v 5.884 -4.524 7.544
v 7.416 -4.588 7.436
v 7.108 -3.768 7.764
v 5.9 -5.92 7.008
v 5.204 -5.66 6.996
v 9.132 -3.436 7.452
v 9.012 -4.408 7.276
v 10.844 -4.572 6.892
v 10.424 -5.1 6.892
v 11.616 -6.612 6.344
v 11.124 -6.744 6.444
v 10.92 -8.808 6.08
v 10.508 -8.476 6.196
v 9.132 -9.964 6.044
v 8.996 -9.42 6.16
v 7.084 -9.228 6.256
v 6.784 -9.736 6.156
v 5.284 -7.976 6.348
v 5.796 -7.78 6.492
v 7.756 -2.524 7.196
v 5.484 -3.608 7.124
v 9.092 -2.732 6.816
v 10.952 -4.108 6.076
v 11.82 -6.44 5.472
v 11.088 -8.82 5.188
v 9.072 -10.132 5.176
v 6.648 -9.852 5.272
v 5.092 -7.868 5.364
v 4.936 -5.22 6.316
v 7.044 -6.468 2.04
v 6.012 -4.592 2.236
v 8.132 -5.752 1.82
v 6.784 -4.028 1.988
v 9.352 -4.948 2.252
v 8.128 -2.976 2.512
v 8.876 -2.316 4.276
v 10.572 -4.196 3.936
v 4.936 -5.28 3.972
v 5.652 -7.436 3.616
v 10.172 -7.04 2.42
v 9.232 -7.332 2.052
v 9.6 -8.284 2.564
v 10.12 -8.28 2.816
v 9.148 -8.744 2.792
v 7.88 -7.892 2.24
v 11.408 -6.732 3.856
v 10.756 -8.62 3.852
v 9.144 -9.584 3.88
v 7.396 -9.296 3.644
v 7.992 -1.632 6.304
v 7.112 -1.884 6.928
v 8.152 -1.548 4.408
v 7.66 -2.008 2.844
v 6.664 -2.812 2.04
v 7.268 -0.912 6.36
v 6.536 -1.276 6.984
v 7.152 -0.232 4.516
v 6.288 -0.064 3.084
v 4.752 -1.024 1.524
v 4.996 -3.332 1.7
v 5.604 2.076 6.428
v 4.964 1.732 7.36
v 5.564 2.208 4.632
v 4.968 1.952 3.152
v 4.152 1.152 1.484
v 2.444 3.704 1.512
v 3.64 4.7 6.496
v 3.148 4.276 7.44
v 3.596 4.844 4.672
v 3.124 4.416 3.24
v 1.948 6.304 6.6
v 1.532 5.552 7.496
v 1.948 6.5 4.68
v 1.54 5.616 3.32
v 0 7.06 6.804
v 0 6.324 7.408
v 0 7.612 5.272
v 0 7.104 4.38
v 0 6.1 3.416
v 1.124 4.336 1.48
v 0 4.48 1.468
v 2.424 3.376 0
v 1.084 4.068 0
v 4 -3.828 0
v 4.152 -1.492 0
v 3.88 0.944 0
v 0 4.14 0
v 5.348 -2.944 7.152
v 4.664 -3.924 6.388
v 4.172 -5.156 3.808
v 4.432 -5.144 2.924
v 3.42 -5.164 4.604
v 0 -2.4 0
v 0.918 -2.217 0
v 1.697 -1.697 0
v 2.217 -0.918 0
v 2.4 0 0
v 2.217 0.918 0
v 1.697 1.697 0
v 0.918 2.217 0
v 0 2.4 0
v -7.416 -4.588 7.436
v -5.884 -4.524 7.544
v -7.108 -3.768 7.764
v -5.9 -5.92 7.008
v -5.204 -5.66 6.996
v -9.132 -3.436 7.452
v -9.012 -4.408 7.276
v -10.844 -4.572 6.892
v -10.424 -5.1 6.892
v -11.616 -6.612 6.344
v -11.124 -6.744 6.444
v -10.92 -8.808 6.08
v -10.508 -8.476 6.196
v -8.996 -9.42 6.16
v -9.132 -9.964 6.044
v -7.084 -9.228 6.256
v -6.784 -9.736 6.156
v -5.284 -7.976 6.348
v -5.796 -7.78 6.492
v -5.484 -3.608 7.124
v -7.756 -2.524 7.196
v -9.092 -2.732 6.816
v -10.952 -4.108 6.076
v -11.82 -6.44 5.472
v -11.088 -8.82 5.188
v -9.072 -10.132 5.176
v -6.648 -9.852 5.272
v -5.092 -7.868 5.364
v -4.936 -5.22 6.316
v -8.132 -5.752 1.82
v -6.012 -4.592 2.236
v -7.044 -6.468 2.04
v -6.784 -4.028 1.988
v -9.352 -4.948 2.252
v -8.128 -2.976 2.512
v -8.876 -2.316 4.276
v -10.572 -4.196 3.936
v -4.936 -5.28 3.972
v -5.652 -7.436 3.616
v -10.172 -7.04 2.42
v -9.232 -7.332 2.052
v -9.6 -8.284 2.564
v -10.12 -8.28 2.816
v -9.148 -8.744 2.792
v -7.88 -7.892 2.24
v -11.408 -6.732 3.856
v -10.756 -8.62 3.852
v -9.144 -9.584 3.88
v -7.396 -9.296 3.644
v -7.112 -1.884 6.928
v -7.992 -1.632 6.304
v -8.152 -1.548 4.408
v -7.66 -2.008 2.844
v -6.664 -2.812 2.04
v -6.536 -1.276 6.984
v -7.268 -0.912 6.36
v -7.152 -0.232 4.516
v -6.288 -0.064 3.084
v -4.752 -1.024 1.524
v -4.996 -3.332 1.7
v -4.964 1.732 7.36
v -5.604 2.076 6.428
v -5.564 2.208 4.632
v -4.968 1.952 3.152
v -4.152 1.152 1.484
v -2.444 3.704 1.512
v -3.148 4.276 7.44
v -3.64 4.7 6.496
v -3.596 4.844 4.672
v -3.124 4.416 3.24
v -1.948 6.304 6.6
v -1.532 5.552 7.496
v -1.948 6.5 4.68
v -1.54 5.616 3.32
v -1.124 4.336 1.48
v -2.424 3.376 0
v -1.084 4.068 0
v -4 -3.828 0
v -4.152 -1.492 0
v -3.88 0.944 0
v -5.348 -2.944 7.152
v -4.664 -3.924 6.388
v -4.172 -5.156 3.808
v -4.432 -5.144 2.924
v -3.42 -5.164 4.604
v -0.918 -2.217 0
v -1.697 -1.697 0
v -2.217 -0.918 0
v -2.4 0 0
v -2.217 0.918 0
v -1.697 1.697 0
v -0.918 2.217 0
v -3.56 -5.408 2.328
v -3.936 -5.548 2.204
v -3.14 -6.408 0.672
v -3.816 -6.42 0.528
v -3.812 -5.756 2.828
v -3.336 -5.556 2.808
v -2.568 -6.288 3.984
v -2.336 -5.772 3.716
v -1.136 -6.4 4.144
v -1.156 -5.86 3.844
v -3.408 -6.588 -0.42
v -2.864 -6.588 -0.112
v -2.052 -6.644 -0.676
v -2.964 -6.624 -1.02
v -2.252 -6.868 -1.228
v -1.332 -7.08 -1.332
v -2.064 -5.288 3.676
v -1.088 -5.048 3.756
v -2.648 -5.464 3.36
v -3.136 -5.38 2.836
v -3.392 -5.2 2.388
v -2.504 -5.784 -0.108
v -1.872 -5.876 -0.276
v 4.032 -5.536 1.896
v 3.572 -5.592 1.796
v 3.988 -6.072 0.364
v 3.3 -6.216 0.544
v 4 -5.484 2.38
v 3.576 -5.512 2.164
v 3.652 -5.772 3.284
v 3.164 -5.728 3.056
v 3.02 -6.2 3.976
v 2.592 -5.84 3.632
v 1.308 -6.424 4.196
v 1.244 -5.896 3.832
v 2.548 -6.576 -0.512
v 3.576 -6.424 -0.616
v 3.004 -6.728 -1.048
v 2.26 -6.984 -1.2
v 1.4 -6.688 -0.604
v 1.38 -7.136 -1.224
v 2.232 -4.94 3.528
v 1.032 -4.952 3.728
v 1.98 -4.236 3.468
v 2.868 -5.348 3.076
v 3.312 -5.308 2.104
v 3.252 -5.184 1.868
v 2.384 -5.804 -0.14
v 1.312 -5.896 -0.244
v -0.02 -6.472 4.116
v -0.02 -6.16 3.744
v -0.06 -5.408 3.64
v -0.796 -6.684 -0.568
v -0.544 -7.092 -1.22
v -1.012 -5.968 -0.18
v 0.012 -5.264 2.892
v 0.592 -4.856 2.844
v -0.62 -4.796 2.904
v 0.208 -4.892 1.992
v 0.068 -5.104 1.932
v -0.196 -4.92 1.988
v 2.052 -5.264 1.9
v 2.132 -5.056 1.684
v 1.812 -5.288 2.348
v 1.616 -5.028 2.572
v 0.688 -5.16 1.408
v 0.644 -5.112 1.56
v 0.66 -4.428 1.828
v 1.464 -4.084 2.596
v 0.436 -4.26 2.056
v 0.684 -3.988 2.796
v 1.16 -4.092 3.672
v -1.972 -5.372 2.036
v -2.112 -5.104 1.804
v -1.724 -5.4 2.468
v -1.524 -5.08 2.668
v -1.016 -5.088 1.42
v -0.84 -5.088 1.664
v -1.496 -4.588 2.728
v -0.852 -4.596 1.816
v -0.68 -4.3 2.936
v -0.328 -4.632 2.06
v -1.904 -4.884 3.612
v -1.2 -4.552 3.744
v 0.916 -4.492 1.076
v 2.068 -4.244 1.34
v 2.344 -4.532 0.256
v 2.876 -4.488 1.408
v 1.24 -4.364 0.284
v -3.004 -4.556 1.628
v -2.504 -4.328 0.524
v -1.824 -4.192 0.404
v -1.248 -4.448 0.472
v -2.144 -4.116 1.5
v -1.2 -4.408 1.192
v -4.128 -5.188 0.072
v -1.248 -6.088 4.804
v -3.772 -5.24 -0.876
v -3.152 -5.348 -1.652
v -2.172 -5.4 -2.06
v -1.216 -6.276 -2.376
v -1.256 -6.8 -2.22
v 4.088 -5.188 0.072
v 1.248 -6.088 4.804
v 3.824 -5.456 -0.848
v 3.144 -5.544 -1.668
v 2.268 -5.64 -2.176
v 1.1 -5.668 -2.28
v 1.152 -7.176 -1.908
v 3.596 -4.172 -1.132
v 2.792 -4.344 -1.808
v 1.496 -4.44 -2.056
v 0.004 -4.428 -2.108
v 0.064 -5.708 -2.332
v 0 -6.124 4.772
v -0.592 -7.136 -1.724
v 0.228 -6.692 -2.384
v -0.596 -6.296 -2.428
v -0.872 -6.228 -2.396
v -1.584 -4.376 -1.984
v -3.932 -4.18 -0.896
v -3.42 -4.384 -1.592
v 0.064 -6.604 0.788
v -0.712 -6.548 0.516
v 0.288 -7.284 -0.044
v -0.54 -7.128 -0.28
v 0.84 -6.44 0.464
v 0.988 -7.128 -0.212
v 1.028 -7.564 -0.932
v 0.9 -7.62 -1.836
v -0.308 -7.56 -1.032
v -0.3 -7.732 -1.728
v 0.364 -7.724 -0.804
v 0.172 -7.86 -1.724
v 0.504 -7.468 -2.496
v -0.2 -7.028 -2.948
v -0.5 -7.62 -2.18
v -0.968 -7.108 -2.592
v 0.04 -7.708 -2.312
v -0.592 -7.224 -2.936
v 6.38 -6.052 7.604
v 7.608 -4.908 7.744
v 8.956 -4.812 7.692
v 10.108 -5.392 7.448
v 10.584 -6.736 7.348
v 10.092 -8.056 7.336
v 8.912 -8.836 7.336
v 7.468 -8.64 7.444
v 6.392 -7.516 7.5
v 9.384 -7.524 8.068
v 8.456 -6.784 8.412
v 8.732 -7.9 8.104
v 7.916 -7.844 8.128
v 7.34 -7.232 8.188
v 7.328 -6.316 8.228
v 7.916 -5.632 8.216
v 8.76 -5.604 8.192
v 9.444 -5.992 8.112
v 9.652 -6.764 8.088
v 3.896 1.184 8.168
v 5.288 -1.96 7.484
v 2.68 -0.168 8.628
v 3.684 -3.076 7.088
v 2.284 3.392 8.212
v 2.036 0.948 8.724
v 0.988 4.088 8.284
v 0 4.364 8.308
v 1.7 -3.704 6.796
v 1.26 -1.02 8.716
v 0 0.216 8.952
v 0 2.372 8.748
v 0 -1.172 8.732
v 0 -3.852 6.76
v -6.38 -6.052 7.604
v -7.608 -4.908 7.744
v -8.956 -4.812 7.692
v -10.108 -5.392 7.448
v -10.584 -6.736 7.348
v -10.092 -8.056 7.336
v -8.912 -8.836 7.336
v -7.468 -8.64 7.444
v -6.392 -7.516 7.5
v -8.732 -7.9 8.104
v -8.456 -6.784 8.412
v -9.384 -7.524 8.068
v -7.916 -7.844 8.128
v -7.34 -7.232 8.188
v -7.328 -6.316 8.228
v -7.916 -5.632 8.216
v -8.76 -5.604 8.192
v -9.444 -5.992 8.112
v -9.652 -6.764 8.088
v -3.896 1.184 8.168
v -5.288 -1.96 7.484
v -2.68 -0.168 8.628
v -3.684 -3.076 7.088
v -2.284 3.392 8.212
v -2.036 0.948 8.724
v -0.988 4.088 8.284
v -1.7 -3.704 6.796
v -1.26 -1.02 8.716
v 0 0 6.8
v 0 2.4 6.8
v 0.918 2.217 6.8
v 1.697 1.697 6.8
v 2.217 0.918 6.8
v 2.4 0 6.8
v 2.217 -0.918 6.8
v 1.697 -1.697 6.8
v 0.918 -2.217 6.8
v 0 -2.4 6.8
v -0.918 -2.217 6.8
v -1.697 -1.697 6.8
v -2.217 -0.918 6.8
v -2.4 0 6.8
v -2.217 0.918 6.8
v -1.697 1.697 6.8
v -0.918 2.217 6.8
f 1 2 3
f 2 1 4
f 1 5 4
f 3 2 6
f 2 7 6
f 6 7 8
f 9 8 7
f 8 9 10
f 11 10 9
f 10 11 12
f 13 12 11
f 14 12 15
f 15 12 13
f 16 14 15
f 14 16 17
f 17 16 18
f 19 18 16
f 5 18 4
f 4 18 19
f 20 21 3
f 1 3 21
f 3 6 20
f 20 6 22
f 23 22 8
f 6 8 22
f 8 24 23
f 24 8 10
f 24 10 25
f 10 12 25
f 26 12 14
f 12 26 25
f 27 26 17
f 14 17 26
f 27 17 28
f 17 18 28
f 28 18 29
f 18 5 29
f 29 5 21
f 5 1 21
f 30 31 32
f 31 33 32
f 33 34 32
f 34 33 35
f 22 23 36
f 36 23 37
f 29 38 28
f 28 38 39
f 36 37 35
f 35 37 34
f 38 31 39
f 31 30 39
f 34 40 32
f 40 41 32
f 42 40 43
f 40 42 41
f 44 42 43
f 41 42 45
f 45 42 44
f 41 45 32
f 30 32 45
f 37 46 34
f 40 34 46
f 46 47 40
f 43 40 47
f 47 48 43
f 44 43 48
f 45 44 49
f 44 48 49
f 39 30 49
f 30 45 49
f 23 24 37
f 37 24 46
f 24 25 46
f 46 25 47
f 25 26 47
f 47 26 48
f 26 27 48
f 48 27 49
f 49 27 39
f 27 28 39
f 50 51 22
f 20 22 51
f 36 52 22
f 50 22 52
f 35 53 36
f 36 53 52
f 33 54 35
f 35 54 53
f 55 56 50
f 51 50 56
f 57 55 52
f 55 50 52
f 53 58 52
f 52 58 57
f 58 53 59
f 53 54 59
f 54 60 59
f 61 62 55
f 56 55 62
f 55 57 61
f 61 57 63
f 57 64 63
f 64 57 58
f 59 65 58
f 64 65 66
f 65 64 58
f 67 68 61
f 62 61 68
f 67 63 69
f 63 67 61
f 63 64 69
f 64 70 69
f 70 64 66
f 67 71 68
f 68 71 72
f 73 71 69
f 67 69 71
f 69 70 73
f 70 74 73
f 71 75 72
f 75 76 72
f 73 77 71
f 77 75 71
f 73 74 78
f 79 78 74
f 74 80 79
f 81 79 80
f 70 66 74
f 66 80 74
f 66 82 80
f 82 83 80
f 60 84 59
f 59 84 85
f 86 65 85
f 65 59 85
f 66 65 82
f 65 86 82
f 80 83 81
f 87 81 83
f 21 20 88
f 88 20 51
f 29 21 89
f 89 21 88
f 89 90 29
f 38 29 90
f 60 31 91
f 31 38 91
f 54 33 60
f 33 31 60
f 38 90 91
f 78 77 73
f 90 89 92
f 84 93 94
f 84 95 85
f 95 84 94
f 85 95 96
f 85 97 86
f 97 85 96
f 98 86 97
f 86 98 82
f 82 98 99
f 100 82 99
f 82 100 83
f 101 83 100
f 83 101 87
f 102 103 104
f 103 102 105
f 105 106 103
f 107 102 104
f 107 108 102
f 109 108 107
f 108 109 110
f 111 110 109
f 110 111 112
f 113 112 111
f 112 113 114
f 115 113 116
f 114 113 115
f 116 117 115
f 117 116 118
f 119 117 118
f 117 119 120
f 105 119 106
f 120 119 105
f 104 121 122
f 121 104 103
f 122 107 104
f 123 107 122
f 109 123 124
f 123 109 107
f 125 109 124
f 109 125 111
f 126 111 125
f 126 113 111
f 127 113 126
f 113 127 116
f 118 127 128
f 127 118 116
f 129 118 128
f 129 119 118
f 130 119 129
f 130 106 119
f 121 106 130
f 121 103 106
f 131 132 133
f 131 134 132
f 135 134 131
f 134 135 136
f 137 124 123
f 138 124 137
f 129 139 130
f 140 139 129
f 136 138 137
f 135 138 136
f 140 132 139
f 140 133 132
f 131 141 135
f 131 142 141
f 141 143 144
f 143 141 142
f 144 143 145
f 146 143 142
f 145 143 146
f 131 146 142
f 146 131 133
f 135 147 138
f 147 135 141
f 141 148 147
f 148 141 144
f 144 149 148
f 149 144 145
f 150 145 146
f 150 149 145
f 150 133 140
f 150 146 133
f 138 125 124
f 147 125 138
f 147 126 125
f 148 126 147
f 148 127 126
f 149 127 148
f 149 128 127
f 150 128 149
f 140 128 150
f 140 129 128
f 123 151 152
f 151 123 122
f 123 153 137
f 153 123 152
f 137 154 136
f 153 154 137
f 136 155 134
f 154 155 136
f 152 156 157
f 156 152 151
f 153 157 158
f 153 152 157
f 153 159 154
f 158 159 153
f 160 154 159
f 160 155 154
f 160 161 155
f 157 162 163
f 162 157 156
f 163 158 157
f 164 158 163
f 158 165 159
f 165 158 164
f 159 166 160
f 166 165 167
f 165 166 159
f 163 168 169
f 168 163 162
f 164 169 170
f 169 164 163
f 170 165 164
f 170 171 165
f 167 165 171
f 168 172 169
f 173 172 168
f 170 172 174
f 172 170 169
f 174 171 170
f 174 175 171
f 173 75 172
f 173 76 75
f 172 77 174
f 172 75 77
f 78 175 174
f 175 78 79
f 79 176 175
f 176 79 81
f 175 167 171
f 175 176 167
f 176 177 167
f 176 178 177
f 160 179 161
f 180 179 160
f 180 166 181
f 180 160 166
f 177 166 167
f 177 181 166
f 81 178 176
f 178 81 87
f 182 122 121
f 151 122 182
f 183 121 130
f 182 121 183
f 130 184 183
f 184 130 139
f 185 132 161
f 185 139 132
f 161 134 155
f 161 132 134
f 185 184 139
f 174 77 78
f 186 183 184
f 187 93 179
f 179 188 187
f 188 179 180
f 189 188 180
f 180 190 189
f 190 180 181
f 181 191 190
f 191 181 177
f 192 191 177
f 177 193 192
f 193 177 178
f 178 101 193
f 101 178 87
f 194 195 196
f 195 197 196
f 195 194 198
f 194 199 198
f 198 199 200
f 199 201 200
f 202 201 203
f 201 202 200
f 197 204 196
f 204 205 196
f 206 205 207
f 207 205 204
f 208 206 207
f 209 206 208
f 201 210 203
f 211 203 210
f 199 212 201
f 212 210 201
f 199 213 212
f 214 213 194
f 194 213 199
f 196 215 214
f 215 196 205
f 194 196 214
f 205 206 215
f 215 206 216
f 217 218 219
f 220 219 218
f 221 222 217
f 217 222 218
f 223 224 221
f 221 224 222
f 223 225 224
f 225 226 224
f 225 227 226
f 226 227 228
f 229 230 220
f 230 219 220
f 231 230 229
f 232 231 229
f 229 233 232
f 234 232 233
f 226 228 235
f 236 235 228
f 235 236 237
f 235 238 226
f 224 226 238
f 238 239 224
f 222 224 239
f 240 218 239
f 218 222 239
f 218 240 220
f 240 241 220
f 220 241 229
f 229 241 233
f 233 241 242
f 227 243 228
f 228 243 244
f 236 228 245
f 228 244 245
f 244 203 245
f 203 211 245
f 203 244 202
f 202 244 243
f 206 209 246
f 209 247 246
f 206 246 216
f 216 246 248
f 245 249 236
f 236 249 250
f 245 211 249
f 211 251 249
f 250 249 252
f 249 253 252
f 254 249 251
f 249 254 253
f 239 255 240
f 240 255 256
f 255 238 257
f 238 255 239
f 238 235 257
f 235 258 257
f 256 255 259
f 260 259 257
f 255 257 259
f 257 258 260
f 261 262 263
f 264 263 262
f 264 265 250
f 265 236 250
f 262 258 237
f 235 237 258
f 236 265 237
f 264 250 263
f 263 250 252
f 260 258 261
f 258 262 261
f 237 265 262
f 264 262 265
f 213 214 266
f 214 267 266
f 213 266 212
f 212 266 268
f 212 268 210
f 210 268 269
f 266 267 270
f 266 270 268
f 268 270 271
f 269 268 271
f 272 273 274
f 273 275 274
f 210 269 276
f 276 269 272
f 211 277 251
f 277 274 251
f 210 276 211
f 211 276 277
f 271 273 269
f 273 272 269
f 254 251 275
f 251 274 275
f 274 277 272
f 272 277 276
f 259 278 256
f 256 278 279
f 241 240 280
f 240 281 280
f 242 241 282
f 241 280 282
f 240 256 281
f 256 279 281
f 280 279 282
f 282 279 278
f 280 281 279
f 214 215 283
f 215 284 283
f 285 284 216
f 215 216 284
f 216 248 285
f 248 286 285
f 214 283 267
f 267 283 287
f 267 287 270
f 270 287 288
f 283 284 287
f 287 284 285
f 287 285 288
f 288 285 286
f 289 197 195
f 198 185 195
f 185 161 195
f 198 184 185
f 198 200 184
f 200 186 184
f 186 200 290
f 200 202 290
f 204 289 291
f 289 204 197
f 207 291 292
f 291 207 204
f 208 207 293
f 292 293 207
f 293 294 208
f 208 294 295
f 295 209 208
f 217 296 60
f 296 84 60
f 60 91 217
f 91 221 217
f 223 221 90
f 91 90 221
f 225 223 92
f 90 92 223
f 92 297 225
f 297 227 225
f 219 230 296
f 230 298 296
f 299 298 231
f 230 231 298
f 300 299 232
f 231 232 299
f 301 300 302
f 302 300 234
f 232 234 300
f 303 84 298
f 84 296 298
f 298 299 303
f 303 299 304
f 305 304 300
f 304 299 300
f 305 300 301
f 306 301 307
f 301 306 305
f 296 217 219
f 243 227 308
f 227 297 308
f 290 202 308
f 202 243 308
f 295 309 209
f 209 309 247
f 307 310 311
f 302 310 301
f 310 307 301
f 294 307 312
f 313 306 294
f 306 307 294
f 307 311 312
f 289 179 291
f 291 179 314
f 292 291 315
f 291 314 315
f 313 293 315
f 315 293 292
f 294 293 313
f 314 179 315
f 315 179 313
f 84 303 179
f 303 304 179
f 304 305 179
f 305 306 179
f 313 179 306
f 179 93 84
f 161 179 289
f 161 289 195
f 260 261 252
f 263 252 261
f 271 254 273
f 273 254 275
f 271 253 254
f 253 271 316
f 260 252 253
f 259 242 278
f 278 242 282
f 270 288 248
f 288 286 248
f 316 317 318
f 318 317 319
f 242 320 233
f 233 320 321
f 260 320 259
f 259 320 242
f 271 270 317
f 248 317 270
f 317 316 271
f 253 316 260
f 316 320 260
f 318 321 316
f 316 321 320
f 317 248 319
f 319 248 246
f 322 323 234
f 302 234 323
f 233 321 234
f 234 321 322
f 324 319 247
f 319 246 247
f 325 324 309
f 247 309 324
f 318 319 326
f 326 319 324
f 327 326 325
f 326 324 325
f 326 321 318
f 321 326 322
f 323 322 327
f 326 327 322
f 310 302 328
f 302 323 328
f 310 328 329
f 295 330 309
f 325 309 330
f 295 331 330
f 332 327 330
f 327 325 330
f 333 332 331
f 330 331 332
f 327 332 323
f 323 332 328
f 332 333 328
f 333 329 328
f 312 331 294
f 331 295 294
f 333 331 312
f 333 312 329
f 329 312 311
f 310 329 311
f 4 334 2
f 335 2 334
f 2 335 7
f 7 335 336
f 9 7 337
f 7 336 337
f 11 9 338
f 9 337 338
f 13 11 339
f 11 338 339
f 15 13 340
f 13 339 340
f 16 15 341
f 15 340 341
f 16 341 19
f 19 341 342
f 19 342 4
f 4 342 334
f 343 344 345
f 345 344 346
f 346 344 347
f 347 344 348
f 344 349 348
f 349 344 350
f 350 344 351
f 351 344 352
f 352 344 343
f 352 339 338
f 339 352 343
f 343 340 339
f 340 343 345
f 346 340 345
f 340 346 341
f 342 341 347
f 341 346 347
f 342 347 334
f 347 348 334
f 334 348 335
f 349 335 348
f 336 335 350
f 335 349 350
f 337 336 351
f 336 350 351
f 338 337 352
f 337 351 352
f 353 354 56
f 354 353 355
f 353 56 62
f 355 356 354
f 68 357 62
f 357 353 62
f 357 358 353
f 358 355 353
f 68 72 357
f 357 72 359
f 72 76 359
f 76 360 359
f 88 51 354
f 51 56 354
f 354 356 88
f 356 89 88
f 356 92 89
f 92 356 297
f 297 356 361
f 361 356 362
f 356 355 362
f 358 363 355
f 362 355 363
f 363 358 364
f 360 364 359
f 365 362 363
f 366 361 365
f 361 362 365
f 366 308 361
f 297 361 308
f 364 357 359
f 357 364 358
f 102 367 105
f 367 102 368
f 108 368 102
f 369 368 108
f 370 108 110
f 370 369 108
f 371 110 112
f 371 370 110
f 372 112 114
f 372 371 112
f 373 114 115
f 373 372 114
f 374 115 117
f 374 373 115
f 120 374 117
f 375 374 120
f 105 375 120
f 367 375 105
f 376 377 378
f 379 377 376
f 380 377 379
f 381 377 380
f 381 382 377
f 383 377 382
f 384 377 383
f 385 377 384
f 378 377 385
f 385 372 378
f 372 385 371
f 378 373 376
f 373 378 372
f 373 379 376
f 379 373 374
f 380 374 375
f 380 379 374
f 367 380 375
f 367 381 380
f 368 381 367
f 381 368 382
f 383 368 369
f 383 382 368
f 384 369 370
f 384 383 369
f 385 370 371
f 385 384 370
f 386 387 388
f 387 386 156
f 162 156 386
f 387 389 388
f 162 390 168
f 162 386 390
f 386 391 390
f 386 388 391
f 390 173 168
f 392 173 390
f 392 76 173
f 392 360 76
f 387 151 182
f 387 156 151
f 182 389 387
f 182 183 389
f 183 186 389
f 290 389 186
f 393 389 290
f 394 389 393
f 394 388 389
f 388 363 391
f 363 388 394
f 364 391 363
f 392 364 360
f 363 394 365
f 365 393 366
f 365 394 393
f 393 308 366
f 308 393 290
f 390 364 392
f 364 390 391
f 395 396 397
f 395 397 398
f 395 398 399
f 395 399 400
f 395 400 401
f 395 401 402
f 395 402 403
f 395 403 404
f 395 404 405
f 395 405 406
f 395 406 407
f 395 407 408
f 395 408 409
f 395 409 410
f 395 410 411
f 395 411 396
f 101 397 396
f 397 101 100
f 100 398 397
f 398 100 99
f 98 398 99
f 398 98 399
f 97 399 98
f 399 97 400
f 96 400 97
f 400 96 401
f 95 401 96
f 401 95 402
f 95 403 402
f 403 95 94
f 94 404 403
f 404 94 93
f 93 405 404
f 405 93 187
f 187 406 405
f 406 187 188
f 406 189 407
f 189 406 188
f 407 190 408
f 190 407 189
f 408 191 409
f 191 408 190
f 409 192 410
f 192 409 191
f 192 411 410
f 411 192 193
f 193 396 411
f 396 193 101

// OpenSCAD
use <../lib.scad>
use <../p/4-4cylc.scad>
use <s/85947s01.scad>
use <s/85947s02.scad>
use <s/85947s03.scad>
use <s/85947s04.scad>
function ldraw_lib__85947() = [
// 0 Minifig Head Alien Squidman
// 0 Name: 85947.dat
// 0 Author: Philippe Hurbain [Philo]
// 0 !LDRAW_ORG Part UPDATE 2013-01
// 0 !LICENSE Licensed under CC BY 4.0 : see CAreadme.txt
// 
// 0 BFC CERTIFY CCW
  [0,"BFC","CERTIFY"],
  [0,"BFC","CCW"],
// 
// 0 !HISTORY 2013-01-06 {LEGO Digital Designer} Original part shape
// 0 !HISTORY 2013-01-06 [Philo] File preparation for LDraw Parts Tracker
// 0 !HISTORY 2013-07-21 [PTadmin] Official Update 2013-01
// 
// 
// 1 16 0 0 0 1 0 0 0 1 0 0 0 1 s\85947s01.dat
  [1,16,0,0,0,1,0,0,0,1,0,0,0,1, ldraw_lib__s__85947s01()],
// 1 16 0 0 0 -1 0 0 0 1 0 0 0 1 s\85947s01.dat
  [1,16,0,0,0,-1,0,0,0,1,0,0,0,1, ldraw_lib__s__85947s01()],
// 1 16 0 0 0 1 0 0 0 1 0 0 0 1 s\85947s02.dat
  [1,16,0,0,0,1,0,0,0,1,0,0,0,1, ldraw_lib__s__85947s02()],
// 1 16 0 0 0 1 0 0 0 1 0 0 0 1 s\85947s03.dat
  [1,16,0,0,0,1,0,0,0,1,0,0,0,1, ldraw_lib__s__85947s03()],
// 1 16 0 0 0 1 0 0 0 1 0 0 0 1 s\85947s04.dat
  [1,16,0,0,0,1,0,0,0,1,0,0,0,1, ldraw_lib__s__85947s04()],
// 1 16 0 0 0 -1 0 0 0 1 0 0 0 1 s\85947s04.dat
  [1,16,0,0,0,-1,0,0,0,1,0,0,0,1, ldraw_lib__s__85947s04()],
// 0 BFC INVERTNEXT
  [0,"BFC","INVERTNEXT"],
// 1 16 0 -17 0 0 0 6 0 17 0 6 0 0 4-4cylc.dat
  [1,16,0,-17,0,0,0,6,0,17,0,6,0,0, ldraw_lib__4_4cylc()],
// 5 24 0 -17.01 17.65 0 -18.52 15.81 3.83 -18.74 13.88 -3.83 -18.74 13.88
  [5,24,0,-17.01,17.65,0,-18.52,15.81,3.83,-18.74,13.88,-3.83,-18.74,13.88],
// 5 24 0 -13.18 19.03 0 -17.01 17.65 4.87 -16.5 15.76 -4.87 -16.5 15.76
  [5,24,0,-13.18,19.03,0,-17.01,17.65,4.87,-16.5,15.76,-4.87,-16.5,15.76],
// 5 24 0 -8.54 15.25 0 -10.95 17.76 3.85 -8.3 14.04 -3.85 -8.3 14.04
  [5,24,0,-8.54,15.25,0,-10.95,17.76,3.85,-8.3,14.04,-3.85,-8.3,14.04],
// 5 24 0 -3.67 11.2 0 -8.54 15.25 2.81 -3.7 10.84 -2.81 -3.7 10.84
  [5,24,0,-3.67,11.2,0,-8.54,15.25,2.81,-3.7,10.84,-2.81,-3.7,10.84],
// 5 24 0 0 10.35 0 -3.67 11.2 2.71 0 10.17 -2.71 0 10.17
  [5,24,0,0,10.35,0,-3.67,11.2,2.71,0,10.17,-2.71,0,10.17],
// 5 24 0 -10.95 17.76 0 -13.18 19.03 4.87 -11.7 16.25 -4.87 -11.7 16.25
  [5,24,0,-10.95,17.76,0,-13.18,19.03,4.87,-11.7,16.25,-4.87,-11.7,16.25],
// 5 24 0 -18.52 15.81 0 -20.77 10.91 2.47 -20.71 10.22 -2.47 -20.71 10.22
  [5,24,0,-18.52,15.81,0,-20.77,10.91,2.47,-20.71,10.22,-2.47,-20.71,10.22],
// 5 24 0 -21.87 5.93 0 -22.38 0.54 5.09 -21.81 2.37 -5.09 -21.81 2.37
  [5,24,0,-21.87,5.93,0,-22.38,0.54,5.09,-21.81,2.37,-5.09,-21.81,2.37],
// 5 24 0 -20.77 10.91 0 -21.87 5.93 2.47 -20.71 10.22 -2.47 -20.71 10.22
  [5,24,0,-20.77,10.91,0,-21.87,5.93,2.47,-20.71,10.22,-2.47,-20.71,10.22],
// 5 24 0 -22.38 0.54 0 -21.83 -2.93 3.15 -21.79 -2.55 -3.15 -21.79 -2.55
  [5,24,0,-22.38,0.54,0,-21.83,-2.93,3.15,-21.79,-2.55,-3.15,-21.79,-2.55],
// 5 24 0 -21.83 -2.93 0 -16.9 -9.63 4.25 -16.99 -9.26 -4.25 -16.99 -9.26
  [5,24,0,-21.83,-2.93,0,-16.9,-9.63,4.25,-16.99,-9.26,-4.25,-16.99,-9.26],
// 5 24 0 -16.9 -9.63 0 -11.93 -15.31 4.25 -16.99 -9.26 -4.25 -16.99 -9.26
  [5,24,0,-16.9,-9.63,0,-11.93,-15.31,4.25,-16.99,-9.26,-4.25,-16.99,-9.26],
];
module ldraw_lib__85947(step=0, col=false, unit=2/5, alt=false, line=0.2, solid=!$preview)
    makepoly(ldraw_lib__85947(), step=step, col=col, unit=unit, alt=alt, line=line, solid=solid);
ldraw_lib__85947(line=0.2);
